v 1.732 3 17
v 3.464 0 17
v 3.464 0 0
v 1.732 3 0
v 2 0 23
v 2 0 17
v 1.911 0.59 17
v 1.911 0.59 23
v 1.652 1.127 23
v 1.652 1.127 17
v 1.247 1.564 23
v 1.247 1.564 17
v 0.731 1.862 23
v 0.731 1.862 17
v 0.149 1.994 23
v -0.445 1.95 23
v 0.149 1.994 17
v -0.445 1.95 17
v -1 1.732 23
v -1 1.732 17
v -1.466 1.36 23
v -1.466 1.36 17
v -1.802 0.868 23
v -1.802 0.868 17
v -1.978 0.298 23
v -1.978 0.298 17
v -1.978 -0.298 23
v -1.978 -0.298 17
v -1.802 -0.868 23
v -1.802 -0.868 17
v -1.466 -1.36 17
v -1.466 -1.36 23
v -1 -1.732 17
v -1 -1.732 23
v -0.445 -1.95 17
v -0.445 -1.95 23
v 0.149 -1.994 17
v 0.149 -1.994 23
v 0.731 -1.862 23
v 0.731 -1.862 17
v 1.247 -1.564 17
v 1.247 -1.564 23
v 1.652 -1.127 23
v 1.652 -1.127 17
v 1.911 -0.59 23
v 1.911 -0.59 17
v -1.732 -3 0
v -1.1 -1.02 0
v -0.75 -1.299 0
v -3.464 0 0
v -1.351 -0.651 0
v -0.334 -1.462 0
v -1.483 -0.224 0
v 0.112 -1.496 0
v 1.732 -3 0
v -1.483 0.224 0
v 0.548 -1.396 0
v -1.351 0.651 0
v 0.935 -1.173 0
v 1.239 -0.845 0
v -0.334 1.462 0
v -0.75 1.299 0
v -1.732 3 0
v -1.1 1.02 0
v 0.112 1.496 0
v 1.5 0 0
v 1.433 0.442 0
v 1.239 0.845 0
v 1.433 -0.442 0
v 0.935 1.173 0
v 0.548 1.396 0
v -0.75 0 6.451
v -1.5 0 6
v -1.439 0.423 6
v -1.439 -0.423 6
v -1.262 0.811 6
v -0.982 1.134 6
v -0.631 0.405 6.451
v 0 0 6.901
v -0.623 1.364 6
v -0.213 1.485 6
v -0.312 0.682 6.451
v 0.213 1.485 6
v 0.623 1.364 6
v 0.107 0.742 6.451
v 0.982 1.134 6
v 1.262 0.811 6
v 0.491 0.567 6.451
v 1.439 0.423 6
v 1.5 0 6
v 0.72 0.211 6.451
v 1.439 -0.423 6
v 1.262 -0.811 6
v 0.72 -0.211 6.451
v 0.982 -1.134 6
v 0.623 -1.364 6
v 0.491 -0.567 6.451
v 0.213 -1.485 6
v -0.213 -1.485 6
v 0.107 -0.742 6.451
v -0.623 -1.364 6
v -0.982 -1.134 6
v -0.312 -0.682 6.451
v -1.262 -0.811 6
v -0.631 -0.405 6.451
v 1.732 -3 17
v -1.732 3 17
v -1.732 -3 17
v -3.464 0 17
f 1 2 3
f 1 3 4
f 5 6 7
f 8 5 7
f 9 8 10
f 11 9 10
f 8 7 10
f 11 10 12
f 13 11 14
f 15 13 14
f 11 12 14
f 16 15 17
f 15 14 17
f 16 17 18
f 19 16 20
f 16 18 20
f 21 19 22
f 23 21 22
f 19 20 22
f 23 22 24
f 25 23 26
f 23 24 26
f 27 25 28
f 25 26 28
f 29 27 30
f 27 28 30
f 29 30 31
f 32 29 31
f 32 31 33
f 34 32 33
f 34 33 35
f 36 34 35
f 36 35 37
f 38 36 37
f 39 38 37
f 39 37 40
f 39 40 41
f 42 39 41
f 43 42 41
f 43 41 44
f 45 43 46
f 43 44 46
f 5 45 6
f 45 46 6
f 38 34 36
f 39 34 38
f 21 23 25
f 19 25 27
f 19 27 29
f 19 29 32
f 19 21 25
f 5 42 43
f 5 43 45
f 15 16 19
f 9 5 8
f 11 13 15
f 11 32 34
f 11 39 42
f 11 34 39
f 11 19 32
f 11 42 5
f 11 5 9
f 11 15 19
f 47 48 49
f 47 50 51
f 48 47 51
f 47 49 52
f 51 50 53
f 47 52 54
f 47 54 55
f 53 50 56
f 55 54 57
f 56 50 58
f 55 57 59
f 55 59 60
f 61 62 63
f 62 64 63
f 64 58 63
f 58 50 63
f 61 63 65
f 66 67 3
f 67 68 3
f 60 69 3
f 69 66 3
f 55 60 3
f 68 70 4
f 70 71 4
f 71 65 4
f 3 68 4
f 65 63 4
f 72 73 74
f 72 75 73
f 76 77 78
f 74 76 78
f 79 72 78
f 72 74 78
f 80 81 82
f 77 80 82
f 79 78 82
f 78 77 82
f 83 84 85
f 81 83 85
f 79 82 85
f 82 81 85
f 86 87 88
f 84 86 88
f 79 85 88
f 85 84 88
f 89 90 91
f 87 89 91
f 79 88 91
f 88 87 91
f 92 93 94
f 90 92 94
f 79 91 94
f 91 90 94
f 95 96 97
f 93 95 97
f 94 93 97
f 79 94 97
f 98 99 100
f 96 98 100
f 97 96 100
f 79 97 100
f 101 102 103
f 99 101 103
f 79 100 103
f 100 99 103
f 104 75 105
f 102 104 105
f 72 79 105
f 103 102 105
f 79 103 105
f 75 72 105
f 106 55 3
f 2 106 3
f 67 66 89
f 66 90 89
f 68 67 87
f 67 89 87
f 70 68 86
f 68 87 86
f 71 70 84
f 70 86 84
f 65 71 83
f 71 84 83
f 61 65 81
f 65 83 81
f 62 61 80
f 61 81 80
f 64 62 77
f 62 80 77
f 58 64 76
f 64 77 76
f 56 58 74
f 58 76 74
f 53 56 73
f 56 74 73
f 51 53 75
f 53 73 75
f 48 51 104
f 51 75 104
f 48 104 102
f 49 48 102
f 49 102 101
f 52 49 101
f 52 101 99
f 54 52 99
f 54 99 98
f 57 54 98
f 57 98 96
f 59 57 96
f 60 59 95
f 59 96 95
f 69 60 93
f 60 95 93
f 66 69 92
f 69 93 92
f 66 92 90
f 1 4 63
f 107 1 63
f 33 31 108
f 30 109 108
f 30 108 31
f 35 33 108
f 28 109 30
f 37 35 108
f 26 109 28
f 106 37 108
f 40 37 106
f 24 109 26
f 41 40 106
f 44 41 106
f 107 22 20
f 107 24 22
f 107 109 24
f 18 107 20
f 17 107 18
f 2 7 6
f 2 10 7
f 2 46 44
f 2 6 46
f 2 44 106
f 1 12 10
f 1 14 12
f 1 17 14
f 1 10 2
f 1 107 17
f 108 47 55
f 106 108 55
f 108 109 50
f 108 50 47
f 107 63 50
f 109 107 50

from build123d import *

# Parameters (mm, degrees)
BOSS_EXTRUDE1_DEPTH       = 17
SKETCH2_R                 = 2
BOSS_EXTRUDE2_DEPTH       = 6
F_3_0MM_DOWEL_HOLE1_D     = 3
F_3_0MM_DOWEL_HOLE1_DEPTH = 6
F_3_0MM_DOWEL_HOLE1_TIP   = 0.901290929


with BuildPart() as part:
    # Sketch1 → Boss-Extrude1 (new body)
    with BuildSketch(Plane.XY):
        Polygon((1.732050808, 3), (-1.732050808, 3), (-3.464101615, 0), (-1.732050808, -3), (1.732050808, -3), (3.464101615, 0), align=None)
    extrude(amount=BOSS_EXTRUDE1_DEPTH)

    # Sketch2 → Boss-Extrude2 (add)
    with BuildSketch(Plane.XY.offset(17)):
        Circle(SKETCH2_R)
    extrude(amount=BOSS_EXTRUDE2_DEPTH)

    # Ø3.0mm Dowel Hole1
    with Locations(Plane(origin=(0, 0, 0), x_dir=(-1, 0, 0), z_dir=(0, 0, -1))):
        with Locations((0, 0)):
            Hole(F_3_0MM_DOWEL_HOLE1_D / 2, depth=F_3_0MM_DOWEL_HOLE1_DEPTH)
            with Locations((0, 0, -(F_3_0MM_DOWEL_HOLE1_DEPTH + F_3_0MM_DOWEL_HOLE1_TIP / 2))):  # 118° drill point
                Cone(0, F_3_0MM_DOWEL_HOLE1_D / 2, F_3_0MM_DOWEL_HOLE1_TIP, mode=Mode.SUBTRACT)


solid = part.part
